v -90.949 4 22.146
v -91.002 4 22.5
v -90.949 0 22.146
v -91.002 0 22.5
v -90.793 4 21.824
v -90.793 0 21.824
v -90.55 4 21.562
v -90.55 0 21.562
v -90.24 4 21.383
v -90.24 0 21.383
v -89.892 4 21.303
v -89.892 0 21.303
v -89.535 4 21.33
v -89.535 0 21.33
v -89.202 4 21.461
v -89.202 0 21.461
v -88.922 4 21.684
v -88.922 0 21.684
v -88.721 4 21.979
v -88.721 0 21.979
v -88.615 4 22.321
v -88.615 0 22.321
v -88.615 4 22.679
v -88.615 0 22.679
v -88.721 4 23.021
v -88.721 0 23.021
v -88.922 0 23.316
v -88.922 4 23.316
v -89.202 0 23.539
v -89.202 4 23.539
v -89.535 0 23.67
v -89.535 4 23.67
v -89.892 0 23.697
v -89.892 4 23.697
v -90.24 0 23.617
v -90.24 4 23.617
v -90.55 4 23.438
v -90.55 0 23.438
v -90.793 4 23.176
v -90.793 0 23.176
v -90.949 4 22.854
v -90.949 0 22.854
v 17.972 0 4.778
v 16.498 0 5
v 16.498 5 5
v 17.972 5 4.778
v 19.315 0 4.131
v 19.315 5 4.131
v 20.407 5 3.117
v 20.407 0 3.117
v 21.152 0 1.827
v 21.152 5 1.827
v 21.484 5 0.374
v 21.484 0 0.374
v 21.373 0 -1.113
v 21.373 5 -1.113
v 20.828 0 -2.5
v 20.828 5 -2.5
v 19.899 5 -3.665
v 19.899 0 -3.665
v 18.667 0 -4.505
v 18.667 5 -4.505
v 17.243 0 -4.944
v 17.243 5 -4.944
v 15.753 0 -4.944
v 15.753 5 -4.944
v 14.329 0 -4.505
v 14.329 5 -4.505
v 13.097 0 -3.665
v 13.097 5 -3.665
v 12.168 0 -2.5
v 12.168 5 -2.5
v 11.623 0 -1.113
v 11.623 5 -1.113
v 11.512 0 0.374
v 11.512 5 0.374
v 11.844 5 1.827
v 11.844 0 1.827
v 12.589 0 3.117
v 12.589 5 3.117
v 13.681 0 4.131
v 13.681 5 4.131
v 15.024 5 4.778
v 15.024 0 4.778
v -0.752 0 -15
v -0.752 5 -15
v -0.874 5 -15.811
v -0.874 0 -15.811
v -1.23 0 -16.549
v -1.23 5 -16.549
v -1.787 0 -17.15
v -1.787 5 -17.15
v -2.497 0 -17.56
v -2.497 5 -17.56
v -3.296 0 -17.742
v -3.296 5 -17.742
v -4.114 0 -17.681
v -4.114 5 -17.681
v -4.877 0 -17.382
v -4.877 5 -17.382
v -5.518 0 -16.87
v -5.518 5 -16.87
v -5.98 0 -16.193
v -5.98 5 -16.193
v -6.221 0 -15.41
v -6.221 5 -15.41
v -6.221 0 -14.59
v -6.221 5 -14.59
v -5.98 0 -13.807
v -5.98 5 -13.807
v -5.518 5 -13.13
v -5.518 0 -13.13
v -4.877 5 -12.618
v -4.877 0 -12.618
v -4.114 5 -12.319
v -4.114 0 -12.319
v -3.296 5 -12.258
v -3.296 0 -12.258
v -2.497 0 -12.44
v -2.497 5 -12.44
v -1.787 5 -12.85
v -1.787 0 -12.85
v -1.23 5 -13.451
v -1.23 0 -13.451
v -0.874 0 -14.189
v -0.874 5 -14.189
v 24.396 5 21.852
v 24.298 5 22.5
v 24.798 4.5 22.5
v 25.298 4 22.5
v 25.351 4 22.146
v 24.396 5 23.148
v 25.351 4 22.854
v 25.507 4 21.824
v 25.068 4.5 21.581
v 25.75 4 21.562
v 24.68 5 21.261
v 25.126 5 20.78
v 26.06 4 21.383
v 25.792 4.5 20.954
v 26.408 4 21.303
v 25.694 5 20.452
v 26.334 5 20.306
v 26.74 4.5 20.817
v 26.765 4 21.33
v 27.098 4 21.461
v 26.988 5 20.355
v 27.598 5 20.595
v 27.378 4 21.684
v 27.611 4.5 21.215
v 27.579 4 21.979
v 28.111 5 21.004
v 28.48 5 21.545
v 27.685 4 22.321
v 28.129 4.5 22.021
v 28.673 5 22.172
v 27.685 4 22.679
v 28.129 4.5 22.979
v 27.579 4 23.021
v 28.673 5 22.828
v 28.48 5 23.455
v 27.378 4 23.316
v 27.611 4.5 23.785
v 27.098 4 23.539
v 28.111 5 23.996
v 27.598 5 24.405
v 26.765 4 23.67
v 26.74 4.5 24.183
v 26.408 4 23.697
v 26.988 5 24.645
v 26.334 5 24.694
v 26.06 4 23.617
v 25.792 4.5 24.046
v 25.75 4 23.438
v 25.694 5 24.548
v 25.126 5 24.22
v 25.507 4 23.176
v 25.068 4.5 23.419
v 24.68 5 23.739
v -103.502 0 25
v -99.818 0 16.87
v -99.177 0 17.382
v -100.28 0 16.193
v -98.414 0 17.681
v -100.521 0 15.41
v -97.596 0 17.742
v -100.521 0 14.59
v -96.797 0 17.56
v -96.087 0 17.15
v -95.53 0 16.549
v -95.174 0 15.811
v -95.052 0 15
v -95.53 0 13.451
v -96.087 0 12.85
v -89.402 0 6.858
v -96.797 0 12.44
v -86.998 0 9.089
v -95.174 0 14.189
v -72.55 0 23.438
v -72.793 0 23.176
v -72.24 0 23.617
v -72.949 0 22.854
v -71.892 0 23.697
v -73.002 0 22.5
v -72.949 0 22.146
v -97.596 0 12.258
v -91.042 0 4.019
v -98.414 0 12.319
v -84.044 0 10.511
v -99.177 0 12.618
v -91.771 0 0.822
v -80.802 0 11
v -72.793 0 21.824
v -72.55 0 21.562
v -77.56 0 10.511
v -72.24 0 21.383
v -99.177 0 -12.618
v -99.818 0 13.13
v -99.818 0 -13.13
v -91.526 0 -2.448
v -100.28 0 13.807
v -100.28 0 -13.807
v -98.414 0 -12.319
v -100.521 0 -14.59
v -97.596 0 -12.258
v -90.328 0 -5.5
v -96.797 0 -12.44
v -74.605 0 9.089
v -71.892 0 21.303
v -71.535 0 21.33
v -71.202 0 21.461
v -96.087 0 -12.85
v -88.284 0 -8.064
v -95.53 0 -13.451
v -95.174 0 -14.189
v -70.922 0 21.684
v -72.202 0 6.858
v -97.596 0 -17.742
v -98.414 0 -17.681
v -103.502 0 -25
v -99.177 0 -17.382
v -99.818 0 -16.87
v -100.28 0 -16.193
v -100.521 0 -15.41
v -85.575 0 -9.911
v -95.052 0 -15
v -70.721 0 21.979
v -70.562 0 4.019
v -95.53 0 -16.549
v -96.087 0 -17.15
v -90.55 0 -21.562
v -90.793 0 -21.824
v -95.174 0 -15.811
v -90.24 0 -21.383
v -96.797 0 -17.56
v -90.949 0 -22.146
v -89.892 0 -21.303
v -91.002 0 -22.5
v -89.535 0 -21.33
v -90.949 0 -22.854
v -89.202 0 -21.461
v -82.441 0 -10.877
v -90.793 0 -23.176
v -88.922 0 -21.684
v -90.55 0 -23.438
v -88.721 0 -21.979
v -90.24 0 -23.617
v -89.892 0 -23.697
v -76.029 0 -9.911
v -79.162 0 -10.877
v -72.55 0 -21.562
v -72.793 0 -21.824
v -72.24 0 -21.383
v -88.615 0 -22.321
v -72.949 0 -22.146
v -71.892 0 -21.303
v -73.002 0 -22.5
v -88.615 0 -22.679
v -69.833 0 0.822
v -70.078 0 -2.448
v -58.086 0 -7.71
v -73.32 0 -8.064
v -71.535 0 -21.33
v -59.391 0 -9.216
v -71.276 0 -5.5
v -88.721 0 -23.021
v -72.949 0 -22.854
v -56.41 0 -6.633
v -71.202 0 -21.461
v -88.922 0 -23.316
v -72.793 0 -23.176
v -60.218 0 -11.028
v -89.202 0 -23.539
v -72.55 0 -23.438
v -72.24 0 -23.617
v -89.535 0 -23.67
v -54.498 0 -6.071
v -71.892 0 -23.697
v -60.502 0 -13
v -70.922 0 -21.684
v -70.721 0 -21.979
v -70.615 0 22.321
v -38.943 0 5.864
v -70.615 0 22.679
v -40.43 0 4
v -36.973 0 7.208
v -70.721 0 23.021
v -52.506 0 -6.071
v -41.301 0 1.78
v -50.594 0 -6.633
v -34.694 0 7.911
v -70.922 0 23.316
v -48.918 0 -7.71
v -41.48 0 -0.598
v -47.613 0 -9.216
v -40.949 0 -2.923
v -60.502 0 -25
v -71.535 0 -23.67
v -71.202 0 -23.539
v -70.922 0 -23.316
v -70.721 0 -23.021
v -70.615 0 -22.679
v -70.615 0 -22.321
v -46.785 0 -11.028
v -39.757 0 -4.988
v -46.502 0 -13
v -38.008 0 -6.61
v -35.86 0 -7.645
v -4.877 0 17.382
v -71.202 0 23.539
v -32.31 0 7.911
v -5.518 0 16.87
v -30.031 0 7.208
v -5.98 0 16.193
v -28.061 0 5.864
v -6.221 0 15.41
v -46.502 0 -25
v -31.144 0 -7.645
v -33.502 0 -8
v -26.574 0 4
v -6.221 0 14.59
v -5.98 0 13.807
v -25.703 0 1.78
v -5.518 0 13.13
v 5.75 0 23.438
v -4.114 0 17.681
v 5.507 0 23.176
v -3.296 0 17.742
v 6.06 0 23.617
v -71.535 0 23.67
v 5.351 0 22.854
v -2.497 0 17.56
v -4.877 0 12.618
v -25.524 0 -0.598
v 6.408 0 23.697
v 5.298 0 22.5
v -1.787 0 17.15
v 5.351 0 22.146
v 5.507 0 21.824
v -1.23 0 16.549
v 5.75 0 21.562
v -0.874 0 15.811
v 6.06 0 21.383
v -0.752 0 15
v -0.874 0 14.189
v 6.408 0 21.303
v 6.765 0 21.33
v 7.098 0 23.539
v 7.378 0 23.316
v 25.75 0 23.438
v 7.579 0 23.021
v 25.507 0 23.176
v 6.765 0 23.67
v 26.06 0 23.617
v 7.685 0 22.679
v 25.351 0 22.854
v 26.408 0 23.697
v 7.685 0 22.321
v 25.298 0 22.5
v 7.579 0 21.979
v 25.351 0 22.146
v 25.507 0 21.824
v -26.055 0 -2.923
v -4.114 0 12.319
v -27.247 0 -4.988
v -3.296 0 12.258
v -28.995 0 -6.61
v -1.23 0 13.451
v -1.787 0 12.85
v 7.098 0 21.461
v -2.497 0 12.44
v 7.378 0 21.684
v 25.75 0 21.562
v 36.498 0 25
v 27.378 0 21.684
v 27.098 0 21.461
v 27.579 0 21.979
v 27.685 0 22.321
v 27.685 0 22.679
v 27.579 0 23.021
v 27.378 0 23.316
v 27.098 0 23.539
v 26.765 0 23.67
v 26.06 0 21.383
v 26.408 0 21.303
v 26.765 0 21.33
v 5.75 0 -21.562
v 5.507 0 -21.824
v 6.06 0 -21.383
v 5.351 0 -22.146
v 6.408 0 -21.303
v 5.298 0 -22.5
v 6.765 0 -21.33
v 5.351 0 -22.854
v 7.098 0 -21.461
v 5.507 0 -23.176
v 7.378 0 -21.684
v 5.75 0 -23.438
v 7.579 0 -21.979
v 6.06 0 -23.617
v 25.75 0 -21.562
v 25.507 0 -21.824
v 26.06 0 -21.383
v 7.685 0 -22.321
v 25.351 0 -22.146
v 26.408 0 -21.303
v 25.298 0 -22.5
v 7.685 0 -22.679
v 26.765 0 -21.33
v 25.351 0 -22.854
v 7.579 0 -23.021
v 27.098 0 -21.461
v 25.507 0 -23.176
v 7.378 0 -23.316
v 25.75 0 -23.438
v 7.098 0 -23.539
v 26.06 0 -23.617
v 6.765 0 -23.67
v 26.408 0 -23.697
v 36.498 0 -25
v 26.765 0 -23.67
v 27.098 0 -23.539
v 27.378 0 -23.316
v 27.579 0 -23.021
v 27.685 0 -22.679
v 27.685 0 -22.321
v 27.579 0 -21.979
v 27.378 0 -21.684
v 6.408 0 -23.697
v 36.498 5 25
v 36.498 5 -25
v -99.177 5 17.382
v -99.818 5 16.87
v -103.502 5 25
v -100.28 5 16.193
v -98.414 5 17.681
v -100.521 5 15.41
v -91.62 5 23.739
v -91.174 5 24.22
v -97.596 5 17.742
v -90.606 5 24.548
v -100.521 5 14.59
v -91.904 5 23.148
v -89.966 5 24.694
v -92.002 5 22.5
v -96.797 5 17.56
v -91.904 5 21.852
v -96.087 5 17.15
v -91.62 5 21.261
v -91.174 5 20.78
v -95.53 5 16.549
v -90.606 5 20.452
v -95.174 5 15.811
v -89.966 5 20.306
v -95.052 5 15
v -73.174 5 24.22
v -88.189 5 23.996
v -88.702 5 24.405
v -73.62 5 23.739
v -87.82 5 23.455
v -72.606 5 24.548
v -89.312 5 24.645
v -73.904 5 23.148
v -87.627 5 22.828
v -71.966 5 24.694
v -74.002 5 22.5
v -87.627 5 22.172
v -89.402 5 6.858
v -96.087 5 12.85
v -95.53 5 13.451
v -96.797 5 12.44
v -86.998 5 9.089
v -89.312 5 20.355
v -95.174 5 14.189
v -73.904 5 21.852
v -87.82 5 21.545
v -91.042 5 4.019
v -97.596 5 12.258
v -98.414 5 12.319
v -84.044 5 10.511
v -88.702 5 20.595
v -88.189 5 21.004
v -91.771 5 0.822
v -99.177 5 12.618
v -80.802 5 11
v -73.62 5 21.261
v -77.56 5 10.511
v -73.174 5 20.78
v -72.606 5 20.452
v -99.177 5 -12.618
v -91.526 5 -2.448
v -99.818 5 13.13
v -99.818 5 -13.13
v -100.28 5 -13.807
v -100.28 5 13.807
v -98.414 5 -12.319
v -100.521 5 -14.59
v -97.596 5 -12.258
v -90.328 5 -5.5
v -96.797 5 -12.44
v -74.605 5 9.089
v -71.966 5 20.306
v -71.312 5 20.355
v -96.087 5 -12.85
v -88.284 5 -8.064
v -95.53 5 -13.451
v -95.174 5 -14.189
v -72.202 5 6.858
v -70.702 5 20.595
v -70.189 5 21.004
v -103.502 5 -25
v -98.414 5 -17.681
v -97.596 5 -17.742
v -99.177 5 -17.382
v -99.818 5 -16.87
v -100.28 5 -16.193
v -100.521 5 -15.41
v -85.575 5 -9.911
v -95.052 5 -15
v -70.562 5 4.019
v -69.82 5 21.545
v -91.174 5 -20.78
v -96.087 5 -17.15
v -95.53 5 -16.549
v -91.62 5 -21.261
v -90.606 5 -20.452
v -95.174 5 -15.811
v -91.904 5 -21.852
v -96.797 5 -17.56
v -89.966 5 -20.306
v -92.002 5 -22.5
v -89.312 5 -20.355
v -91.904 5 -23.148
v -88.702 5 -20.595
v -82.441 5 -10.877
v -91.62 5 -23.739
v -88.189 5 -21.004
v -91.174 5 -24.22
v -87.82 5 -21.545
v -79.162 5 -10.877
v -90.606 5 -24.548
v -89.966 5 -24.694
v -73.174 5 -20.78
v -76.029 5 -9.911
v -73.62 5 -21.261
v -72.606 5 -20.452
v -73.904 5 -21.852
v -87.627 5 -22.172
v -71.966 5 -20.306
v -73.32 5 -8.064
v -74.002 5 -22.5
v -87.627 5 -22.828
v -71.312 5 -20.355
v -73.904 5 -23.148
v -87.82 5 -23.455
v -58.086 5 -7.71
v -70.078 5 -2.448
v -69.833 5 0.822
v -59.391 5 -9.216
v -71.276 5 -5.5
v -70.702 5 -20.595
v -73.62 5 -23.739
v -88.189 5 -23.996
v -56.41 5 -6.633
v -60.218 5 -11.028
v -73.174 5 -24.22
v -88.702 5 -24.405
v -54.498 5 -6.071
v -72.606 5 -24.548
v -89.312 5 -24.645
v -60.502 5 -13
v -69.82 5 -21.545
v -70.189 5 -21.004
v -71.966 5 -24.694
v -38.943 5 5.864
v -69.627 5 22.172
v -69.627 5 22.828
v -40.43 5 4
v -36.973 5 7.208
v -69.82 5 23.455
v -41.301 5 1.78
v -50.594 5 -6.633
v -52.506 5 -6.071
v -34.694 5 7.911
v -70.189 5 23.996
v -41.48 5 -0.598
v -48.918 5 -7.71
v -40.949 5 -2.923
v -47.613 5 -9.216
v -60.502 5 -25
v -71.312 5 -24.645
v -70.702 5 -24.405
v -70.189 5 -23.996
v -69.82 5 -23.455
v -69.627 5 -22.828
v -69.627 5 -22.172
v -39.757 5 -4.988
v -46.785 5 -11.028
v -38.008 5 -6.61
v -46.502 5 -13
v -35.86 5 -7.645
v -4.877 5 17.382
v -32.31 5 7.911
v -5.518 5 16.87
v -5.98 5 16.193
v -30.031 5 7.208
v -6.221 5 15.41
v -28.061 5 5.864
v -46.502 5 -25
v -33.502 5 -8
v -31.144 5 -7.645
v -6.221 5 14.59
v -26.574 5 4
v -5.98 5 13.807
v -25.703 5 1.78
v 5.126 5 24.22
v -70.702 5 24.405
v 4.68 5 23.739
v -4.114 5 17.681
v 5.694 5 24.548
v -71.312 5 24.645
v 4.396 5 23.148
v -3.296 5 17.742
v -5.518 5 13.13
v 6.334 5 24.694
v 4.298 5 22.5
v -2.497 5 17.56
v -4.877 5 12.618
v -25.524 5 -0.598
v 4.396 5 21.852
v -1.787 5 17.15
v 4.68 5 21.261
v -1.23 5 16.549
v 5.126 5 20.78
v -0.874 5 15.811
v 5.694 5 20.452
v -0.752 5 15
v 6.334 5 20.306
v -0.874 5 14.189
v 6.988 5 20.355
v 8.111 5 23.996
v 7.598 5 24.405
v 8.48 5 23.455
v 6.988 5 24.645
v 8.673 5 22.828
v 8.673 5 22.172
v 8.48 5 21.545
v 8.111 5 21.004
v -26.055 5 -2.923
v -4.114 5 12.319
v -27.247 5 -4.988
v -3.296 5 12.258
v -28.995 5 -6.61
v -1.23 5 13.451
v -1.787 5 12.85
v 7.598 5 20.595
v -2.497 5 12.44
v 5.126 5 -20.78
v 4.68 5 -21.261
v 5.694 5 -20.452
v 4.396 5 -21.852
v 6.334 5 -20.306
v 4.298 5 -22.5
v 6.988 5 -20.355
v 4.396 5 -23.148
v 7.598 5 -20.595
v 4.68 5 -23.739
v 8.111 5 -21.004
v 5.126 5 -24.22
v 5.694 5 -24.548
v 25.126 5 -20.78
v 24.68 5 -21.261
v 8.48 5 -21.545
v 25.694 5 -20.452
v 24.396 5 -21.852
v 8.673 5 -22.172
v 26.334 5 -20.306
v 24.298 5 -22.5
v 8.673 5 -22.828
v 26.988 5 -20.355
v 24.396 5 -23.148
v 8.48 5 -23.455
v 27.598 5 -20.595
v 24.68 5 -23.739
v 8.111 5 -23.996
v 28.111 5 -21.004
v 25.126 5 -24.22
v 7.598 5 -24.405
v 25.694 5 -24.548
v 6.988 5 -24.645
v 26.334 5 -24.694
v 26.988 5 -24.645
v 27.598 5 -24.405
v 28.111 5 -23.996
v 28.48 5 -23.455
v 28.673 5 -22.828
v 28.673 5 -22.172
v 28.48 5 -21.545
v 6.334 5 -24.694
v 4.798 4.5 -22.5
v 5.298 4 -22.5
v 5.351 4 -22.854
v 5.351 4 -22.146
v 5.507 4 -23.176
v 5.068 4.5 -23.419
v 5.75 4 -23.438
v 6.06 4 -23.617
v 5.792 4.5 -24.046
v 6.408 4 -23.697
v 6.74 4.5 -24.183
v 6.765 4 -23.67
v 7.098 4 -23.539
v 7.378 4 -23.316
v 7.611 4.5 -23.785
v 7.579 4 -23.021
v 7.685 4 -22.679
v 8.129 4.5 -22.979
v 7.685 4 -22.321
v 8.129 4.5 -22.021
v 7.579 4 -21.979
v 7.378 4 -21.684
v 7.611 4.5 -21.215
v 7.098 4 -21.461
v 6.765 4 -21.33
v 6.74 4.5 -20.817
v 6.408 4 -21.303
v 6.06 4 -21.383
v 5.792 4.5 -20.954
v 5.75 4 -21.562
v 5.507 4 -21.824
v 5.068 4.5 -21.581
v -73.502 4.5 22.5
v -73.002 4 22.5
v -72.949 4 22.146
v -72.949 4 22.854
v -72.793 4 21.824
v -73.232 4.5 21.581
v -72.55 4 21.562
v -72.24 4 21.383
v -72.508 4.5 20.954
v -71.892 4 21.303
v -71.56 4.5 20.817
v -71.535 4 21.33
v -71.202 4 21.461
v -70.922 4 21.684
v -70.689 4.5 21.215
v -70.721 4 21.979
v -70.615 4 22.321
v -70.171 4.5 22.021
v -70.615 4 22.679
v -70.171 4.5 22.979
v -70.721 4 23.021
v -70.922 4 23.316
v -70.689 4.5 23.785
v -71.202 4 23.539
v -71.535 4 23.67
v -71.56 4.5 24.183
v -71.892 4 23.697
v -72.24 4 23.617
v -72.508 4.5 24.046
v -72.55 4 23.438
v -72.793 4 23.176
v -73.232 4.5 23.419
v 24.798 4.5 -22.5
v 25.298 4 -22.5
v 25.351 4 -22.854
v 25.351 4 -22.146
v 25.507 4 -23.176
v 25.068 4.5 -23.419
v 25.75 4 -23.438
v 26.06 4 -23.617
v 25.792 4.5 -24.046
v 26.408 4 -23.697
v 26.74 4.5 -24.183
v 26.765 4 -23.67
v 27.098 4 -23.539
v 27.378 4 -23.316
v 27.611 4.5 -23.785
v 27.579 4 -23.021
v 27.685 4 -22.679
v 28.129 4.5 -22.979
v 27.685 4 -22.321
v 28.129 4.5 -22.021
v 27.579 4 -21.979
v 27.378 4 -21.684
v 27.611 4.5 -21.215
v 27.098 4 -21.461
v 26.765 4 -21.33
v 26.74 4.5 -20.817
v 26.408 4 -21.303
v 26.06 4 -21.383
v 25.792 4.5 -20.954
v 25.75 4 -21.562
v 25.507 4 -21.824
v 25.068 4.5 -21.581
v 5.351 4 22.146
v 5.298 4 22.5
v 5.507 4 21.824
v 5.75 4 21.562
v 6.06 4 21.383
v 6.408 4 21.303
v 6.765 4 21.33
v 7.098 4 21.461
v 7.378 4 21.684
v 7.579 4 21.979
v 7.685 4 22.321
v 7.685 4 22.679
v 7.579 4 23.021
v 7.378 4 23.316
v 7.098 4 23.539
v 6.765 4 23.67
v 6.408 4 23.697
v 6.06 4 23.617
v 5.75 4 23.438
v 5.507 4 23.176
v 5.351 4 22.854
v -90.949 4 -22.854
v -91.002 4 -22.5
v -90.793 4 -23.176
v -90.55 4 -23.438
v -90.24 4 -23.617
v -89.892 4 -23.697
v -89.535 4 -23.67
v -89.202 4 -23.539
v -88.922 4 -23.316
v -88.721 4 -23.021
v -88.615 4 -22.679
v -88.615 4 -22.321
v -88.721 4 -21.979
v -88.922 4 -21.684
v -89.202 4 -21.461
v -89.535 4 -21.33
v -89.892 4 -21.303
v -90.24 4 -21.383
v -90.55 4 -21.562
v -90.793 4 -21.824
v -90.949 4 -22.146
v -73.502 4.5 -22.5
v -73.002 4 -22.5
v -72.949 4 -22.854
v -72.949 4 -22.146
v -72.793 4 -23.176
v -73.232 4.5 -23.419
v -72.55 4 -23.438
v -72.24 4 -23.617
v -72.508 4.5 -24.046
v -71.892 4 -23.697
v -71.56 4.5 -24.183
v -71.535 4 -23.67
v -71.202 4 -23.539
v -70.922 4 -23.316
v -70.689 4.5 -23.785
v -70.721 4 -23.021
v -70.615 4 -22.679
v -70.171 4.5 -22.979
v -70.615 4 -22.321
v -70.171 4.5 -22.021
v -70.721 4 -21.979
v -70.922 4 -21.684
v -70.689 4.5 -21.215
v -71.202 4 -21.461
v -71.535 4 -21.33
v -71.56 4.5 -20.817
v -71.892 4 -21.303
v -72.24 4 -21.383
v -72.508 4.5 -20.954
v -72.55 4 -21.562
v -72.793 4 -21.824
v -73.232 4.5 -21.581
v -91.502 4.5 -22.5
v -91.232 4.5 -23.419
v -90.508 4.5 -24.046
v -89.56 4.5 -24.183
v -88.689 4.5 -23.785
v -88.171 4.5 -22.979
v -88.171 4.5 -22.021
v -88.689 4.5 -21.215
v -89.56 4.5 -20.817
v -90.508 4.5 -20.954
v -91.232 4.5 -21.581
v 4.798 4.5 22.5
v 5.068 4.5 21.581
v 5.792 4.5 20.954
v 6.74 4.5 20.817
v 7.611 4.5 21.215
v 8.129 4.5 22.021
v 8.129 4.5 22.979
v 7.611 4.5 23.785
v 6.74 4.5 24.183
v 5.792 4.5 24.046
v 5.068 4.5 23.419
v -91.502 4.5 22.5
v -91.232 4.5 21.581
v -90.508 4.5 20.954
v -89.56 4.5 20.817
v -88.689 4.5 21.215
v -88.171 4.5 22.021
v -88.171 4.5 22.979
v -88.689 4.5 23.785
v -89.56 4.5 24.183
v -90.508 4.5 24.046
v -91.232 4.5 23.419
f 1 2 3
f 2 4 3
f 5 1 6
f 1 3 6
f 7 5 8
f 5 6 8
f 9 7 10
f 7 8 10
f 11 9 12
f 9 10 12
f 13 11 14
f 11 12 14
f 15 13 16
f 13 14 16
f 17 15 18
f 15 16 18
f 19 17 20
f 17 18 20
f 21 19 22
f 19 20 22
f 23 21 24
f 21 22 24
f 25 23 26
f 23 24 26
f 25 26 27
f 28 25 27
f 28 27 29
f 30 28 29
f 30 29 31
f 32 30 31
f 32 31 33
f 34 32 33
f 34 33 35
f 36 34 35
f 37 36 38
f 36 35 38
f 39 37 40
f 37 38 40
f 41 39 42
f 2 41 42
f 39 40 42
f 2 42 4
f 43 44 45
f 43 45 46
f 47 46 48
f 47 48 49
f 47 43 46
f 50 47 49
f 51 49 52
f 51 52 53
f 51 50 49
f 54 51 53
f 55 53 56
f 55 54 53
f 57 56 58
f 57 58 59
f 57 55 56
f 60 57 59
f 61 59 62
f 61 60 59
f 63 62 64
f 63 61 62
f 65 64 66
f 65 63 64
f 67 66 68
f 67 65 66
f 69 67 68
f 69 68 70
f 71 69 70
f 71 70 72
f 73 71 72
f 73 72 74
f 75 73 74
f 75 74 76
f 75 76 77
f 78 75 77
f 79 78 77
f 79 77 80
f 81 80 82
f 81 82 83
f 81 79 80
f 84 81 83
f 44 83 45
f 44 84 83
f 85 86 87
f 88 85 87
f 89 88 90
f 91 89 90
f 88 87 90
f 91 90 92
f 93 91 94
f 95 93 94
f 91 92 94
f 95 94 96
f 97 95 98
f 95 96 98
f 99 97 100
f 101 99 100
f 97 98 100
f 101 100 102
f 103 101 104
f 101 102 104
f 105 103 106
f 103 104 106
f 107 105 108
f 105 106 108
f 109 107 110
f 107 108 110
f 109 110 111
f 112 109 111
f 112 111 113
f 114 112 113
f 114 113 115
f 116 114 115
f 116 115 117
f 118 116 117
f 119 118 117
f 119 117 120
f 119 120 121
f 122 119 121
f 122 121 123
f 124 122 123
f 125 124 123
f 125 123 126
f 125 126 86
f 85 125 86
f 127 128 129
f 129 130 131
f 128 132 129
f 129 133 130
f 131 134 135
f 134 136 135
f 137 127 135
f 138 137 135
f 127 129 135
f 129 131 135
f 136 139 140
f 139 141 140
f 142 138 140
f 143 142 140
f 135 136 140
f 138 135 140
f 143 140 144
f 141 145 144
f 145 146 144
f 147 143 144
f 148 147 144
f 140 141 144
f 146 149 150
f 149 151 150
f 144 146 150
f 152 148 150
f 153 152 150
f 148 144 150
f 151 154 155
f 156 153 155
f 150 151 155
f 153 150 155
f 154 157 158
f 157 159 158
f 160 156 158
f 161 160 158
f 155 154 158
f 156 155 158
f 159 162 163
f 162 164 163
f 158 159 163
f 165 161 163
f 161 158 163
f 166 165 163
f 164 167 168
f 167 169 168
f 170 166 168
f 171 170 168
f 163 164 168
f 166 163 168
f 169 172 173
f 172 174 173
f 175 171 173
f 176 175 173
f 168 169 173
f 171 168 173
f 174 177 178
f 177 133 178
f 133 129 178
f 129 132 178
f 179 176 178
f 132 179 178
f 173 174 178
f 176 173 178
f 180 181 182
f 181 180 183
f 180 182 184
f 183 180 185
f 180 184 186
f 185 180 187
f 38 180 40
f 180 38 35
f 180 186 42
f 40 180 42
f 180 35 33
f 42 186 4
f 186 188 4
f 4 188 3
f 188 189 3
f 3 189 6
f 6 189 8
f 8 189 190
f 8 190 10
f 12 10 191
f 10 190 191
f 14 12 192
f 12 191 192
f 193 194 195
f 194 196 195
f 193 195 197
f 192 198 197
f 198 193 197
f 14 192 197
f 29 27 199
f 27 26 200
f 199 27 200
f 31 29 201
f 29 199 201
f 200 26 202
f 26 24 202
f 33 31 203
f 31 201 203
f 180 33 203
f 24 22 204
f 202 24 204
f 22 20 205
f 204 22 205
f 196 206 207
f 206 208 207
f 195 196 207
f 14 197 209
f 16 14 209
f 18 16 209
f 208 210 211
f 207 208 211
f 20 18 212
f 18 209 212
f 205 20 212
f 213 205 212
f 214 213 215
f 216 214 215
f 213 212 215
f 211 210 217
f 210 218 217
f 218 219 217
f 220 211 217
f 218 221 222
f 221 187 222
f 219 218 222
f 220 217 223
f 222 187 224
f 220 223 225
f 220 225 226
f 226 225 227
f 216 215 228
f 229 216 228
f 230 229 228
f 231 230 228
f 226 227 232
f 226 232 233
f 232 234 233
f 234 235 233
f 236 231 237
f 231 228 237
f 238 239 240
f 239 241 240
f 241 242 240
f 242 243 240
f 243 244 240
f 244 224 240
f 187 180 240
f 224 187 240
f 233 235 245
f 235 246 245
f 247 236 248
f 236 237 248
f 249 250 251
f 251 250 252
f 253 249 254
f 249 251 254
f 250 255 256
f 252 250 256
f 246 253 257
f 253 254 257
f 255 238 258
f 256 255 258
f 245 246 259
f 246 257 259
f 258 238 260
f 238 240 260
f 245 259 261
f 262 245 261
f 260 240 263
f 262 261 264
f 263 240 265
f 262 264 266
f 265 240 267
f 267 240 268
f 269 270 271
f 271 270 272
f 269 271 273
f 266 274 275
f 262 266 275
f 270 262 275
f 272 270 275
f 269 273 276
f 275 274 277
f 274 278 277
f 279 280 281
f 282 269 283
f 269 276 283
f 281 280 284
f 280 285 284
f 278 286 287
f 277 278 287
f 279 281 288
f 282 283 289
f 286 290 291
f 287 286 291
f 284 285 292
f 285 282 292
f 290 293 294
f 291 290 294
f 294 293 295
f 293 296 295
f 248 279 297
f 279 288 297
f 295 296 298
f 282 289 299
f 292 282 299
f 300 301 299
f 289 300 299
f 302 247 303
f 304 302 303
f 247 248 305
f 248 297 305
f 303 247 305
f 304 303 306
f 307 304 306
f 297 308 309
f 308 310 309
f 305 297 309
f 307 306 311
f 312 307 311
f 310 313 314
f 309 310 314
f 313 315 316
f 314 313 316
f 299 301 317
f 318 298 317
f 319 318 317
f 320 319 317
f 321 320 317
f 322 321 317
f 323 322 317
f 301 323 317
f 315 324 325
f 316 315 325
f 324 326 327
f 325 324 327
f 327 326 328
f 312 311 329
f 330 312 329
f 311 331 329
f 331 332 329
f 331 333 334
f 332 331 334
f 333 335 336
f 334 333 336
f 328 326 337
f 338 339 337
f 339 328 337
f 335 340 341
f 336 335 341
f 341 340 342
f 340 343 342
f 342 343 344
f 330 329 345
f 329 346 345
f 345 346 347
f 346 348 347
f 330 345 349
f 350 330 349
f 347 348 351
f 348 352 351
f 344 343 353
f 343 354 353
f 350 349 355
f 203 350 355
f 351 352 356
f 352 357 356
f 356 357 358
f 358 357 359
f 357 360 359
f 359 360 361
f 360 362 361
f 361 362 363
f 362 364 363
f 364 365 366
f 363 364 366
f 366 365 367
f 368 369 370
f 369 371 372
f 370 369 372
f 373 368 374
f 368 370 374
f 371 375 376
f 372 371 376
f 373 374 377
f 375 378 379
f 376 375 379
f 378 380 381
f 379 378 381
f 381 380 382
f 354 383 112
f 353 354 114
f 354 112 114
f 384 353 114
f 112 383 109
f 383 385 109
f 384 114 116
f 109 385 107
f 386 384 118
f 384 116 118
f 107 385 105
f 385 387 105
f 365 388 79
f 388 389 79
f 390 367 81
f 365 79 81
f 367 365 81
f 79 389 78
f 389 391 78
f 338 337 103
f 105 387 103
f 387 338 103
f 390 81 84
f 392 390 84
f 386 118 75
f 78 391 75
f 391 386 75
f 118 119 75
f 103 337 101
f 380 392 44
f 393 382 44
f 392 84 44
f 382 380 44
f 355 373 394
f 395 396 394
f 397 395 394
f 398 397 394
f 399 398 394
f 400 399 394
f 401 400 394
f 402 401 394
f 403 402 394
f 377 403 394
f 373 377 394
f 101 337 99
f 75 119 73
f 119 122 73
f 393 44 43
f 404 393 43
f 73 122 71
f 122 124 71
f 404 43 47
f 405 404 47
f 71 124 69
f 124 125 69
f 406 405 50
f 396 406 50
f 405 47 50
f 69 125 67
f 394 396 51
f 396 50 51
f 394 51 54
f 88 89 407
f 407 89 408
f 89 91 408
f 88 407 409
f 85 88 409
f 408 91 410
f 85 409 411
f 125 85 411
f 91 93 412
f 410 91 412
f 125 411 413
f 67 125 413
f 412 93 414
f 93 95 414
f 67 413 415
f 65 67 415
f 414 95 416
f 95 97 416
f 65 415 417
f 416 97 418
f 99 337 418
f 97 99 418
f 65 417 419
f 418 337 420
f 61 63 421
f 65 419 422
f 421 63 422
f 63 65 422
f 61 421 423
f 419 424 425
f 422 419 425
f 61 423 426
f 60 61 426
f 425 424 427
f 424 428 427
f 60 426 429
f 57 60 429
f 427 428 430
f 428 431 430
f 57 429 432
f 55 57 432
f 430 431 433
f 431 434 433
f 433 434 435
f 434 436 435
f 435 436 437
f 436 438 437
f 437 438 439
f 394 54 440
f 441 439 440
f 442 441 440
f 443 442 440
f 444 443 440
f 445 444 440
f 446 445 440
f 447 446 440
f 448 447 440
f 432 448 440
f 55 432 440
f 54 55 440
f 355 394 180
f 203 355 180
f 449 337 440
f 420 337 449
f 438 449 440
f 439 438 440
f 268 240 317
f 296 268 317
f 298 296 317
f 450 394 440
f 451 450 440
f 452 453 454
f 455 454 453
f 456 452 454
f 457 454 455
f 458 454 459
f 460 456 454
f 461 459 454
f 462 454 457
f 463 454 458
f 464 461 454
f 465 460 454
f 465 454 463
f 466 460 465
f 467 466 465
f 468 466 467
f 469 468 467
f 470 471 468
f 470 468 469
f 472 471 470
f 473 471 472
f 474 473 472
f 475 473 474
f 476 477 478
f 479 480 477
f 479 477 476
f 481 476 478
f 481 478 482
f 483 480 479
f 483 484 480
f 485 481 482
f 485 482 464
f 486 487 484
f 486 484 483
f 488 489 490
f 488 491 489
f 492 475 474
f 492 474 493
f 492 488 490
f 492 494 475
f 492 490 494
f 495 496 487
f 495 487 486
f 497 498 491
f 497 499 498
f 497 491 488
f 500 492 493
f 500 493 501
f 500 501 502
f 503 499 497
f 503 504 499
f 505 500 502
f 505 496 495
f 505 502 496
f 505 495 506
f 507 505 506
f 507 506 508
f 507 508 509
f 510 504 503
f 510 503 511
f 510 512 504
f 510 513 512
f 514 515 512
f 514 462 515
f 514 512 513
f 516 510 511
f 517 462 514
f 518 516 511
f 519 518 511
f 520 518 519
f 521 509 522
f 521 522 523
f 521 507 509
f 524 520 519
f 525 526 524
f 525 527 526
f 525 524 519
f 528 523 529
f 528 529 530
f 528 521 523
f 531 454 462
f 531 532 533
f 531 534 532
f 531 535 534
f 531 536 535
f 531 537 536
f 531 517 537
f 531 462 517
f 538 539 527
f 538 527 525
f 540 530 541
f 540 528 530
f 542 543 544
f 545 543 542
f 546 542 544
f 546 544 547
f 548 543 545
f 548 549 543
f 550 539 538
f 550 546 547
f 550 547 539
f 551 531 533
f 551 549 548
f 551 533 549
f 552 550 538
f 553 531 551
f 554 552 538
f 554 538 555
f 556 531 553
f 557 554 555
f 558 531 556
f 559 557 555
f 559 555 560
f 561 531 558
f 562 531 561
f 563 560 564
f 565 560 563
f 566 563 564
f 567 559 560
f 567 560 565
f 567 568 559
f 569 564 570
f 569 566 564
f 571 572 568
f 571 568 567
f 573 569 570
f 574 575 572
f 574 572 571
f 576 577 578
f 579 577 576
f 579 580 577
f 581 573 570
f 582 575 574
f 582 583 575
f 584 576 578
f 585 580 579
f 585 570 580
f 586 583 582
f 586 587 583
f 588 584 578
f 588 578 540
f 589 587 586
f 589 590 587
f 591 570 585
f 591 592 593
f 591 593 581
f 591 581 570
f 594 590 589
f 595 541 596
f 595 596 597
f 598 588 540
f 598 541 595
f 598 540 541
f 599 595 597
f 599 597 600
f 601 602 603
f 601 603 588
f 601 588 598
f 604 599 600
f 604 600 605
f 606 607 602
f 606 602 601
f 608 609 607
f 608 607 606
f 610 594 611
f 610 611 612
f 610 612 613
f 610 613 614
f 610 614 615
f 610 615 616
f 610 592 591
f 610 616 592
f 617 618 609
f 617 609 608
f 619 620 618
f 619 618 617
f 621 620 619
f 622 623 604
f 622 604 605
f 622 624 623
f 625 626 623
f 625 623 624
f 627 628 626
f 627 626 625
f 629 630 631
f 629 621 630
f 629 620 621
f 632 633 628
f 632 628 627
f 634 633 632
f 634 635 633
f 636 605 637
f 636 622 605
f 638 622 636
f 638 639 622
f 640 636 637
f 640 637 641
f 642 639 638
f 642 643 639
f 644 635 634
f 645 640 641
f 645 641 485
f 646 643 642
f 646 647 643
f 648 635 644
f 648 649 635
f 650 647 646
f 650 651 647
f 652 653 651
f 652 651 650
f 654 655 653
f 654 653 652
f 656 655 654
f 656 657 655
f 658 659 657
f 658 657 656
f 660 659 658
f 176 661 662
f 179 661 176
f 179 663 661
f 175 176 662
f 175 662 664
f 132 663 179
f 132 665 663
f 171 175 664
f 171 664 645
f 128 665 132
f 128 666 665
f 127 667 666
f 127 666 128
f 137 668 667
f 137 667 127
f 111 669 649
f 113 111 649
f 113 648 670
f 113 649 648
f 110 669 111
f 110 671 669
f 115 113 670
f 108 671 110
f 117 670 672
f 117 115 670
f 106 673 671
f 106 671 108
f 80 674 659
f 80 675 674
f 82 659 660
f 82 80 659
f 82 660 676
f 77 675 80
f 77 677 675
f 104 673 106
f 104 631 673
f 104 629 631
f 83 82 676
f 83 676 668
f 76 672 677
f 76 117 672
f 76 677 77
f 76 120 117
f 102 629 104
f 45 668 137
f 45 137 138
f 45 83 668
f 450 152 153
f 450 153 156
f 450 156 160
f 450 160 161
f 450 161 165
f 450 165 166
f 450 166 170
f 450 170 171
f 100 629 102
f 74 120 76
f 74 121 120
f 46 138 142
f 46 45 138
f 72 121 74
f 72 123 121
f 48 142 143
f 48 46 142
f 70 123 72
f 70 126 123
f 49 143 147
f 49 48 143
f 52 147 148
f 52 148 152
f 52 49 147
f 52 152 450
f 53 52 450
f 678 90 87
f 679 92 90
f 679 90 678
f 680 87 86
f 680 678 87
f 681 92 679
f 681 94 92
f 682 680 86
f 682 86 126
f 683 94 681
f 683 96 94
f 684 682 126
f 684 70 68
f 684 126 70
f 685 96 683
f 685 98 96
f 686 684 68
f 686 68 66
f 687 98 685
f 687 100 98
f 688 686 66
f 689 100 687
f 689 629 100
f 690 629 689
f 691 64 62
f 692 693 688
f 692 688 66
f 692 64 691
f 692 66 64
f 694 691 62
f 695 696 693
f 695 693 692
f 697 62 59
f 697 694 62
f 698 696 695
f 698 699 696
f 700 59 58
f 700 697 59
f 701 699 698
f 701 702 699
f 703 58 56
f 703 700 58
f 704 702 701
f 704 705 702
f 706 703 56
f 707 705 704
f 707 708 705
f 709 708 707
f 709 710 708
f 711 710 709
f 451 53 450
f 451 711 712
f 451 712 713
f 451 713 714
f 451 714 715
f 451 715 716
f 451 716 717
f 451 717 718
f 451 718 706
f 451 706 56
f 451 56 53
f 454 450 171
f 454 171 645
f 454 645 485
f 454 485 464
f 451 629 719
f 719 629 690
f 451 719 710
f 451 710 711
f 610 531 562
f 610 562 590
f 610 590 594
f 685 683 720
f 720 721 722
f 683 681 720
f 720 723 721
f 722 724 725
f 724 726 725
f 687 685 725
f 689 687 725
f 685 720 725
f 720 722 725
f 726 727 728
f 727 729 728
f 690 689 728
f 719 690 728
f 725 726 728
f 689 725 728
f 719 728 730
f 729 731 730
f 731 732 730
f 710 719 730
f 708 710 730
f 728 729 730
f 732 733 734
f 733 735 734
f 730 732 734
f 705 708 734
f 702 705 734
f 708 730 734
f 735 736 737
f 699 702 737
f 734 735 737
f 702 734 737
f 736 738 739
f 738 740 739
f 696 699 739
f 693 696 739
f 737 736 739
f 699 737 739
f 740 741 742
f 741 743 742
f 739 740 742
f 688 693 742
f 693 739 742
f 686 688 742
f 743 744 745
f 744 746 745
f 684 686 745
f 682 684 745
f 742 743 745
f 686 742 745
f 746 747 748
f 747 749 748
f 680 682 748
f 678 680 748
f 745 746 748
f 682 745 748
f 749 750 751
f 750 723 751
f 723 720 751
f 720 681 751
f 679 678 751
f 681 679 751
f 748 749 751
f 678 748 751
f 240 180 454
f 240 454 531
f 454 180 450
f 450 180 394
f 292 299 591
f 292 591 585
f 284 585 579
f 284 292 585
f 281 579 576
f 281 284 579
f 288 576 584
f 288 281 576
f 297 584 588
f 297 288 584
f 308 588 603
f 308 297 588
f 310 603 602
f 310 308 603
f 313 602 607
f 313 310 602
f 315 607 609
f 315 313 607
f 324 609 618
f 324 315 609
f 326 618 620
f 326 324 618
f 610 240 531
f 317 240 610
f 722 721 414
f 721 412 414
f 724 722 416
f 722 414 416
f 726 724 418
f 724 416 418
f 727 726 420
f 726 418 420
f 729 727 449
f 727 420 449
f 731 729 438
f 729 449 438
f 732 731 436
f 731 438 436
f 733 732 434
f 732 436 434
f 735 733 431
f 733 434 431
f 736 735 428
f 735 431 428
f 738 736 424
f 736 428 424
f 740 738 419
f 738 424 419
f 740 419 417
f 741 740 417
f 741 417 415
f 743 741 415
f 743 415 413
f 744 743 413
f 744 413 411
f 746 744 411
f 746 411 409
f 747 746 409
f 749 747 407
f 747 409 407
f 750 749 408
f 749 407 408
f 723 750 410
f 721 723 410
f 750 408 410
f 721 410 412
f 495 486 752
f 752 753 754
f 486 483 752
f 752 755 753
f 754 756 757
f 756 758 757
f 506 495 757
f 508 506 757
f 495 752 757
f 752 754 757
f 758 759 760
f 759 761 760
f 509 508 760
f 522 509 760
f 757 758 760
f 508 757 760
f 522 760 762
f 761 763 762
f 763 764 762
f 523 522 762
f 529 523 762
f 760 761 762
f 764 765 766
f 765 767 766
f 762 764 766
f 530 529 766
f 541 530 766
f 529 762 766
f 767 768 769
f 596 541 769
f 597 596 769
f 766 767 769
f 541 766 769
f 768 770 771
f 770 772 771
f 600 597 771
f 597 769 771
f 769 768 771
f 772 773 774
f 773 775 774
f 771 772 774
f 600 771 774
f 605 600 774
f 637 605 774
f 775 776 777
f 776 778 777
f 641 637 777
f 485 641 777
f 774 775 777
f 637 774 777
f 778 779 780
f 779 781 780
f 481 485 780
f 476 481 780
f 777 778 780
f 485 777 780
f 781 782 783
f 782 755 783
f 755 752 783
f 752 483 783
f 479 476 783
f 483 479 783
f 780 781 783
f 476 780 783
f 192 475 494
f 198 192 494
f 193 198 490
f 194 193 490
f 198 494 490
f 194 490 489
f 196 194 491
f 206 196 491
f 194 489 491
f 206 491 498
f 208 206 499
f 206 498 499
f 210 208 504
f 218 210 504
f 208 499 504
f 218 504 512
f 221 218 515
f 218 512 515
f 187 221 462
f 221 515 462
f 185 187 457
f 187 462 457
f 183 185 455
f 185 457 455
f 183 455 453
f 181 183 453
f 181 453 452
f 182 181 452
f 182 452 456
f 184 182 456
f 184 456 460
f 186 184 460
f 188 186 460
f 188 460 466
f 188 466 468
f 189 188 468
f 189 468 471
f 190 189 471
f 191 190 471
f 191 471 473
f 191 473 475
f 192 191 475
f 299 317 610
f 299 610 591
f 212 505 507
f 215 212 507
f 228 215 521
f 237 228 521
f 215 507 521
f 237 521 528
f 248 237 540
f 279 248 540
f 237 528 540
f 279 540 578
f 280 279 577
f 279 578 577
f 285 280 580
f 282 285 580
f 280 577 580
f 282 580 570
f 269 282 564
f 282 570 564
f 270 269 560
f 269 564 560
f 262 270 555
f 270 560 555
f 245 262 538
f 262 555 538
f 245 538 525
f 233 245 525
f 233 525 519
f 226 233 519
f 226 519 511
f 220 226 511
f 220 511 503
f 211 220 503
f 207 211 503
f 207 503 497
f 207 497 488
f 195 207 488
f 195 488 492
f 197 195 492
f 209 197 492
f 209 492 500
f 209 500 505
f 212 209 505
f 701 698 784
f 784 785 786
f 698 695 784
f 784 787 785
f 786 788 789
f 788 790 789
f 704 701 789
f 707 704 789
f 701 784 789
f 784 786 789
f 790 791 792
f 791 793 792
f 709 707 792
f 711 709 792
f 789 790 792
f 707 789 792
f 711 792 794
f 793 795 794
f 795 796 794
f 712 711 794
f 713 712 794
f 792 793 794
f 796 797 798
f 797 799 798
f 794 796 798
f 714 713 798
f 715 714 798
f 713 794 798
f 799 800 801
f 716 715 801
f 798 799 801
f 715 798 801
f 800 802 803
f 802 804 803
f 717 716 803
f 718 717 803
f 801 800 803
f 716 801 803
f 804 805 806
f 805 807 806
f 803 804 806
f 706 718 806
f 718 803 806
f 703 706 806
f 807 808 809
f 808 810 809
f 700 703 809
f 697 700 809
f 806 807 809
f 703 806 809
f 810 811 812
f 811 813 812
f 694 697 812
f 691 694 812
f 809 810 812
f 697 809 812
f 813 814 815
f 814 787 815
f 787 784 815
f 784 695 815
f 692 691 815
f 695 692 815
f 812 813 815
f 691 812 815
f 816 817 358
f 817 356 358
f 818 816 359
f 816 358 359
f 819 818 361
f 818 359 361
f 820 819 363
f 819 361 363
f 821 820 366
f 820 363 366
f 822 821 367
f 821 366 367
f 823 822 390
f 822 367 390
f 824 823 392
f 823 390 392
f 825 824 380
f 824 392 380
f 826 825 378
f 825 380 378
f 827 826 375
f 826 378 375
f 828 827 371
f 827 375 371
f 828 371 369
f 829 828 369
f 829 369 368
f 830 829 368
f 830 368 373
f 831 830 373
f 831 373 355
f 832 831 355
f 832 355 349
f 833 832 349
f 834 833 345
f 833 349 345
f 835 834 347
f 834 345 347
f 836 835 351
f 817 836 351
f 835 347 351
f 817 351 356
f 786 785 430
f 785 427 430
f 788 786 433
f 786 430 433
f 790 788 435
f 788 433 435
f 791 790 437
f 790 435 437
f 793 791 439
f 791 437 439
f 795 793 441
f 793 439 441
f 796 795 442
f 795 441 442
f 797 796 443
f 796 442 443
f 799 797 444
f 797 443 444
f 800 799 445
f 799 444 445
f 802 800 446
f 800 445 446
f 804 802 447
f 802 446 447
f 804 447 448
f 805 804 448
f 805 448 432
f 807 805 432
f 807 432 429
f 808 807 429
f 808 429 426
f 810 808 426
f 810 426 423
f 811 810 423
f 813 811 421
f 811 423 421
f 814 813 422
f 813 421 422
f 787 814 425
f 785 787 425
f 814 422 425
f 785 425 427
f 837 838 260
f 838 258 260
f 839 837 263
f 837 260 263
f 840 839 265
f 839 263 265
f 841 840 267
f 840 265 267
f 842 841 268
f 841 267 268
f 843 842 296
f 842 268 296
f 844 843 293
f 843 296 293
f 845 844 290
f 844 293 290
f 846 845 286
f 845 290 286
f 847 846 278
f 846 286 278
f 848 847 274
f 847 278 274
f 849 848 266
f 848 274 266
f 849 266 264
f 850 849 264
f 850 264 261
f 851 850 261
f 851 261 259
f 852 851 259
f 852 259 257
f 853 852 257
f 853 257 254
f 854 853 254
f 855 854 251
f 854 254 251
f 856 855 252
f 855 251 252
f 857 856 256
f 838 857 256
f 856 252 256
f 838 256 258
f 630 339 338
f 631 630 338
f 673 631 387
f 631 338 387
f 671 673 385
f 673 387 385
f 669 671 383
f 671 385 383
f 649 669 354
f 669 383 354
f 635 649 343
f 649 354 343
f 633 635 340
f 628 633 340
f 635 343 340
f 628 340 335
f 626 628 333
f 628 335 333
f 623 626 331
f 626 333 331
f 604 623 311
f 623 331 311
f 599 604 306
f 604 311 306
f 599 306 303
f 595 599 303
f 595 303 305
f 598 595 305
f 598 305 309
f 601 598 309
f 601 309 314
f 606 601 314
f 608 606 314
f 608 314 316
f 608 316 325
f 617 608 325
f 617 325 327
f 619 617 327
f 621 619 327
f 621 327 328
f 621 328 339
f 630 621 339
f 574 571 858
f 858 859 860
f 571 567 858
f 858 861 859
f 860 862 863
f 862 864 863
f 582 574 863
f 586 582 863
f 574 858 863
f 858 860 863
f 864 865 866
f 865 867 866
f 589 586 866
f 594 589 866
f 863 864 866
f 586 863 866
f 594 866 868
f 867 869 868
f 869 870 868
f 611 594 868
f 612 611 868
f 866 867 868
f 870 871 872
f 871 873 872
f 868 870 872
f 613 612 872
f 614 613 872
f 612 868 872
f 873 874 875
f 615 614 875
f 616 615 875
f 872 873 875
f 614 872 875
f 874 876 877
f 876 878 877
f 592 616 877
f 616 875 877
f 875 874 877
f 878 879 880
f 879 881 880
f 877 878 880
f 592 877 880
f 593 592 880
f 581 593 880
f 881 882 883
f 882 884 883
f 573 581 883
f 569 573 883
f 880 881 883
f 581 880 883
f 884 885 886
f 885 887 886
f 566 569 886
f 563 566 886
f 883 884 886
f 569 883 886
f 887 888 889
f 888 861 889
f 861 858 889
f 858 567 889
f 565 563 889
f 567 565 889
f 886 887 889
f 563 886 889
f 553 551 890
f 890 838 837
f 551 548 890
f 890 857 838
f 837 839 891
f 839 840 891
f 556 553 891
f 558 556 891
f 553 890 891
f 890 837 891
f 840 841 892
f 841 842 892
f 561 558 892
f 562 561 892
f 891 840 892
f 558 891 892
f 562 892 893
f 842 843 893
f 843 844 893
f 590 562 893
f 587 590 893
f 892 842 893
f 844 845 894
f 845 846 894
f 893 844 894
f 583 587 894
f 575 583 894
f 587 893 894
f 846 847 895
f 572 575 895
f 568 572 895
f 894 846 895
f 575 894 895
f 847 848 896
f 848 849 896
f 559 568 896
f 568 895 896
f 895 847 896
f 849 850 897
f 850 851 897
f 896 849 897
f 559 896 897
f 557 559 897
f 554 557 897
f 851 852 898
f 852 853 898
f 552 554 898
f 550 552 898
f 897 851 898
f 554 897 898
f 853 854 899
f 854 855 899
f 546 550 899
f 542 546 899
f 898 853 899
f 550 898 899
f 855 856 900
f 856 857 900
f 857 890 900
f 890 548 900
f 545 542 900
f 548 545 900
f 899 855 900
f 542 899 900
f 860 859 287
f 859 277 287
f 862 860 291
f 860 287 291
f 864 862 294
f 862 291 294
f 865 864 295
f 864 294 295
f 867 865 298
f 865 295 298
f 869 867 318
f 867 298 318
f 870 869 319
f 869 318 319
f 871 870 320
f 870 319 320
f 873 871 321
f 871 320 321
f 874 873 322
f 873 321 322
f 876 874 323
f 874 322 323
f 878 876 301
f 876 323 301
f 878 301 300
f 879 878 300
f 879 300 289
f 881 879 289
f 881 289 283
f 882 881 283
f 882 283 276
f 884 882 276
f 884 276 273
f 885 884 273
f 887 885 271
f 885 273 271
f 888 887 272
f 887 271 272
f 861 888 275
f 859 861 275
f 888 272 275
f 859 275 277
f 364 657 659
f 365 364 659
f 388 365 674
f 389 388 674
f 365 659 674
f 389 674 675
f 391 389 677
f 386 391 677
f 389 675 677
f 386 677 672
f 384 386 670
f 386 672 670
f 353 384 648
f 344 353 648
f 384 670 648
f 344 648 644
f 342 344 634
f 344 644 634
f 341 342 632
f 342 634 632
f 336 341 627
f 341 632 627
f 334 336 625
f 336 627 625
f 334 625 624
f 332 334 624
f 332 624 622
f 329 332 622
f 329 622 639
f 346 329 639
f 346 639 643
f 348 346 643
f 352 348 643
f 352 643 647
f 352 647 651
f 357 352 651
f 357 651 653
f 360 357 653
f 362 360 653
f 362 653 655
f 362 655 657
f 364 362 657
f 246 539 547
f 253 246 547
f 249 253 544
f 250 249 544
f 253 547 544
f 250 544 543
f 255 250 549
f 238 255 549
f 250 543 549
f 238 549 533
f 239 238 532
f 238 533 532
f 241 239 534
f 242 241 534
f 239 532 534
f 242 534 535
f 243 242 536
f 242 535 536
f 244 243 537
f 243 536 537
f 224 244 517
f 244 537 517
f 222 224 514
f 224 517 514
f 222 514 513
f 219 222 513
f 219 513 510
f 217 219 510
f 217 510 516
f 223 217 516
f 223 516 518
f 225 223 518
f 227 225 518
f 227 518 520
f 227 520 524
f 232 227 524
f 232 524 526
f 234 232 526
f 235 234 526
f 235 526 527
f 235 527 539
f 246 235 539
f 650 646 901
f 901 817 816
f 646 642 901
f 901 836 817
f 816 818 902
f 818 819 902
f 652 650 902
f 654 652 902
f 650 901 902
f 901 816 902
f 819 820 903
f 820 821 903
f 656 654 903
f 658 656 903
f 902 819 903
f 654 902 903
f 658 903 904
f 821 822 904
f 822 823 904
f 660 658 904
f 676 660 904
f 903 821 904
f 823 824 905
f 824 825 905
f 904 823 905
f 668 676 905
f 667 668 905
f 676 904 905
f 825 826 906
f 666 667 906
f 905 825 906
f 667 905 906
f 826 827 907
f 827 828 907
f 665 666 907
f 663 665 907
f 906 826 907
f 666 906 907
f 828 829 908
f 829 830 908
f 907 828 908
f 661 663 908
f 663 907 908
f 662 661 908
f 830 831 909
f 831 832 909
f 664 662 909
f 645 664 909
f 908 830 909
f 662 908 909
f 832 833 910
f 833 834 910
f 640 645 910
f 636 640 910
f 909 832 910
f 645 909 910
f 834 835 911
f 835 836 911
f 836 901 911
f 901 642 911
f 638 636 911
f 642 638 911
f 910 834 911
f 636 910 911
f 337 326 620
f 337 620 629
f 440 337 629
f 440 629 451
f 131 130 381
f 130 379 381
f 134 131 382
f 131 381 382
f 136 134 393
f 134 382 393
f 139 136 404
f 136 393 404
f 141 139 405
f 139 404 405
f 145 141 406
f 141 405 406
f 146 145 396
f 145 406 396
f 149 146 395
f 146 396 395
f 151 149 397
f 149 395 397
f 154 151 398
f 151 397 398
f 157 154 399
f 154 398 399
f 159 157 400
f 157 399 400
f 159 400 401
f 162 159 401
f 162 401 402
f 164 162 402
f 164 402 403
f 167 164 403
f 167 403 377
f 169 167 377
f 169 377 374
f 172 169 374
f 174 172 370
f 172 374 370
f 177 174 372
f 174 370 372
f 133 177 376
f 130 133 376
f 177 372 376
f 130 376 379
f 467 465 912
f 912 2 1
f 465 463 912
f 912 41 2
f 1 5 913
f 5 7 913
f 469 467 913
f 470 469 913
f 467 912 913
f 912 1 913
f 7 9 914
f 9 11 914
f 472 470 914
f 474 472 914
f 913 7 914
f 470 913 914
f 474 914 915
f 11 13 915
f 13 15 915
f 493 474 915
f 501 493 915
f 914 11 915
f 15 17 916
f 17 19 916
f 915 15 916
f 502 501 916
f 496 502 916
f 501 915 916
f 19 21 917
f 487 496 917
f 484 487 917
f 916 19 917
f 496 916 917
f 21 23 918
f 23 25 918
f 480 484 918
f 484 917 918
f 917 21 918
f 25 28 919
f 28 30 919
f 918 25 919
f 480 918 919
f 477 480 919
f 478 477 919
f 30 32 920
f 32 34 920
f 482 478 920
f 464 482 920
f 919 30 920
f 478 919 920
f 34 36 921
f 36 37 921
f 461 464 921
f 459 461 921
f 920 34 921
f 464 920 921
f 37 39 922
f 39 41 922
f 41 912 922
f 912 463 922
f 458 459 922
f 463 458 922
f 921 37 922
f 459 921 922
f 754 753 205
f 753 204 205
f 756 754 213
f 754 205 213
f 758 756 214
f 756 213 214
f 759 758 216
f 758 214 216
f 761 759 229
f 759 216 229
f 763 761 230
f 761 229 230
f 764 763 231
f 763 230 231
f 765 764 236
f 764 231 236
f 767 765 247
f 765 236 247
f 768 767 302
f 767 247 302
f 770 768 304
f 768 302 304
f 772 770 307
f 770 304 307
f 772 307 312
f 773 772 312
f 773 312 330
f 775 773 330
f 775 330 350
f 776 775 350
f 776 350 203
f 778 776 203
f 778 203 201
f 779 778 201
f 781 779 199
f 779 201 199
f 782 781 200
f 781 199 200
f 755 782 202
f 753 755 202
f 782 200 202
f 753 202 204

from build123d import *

# Parameters (mm, degrees)
SKETCH1_W                                           = 140
SKETCH1_H                                           = 50
SKETCH1_R                                           = 5
BOSS_EXTRUDE2_DEPTH                                 = 5
CUT_EXTRUDE1_REACH                                  = 108.596
SKETCH5_R                                           = 8
CUT_EXTRUDE2_REACH                                  = 108.596
SKETCH14_R                                          = 11
CSK_FOR_M2_COUNTERSUNK_FLAT_HEAD_SCREW1_D           = 2.4
CSK_FOR_M2_COUNTERSUNK_FLAT_HEAD_SCREW1_CSINK_D     = 4.4
CSK_FOR_M2_COUNTERSUNK_FLAT_HEAD_SCREW1_CSINK_ANGLE = 90
M5_CLEARANCE_HOLE1_D                                = 5.5
M5_CLEARANCE_HOLE1_DEPTH                            = 19.75
M5_CLEARANCE_HOLE1_TIP                              = 1.652366702
CUT_EXTRUDE3_DEPTH                                  = 107.595732004


with BuildPart() as part:
    # Sketch1 → Boss-Extrude2 (new body)
    with BuildSketch(Plane(origin=(0, 0, 0), x_dir=(1, 0, 0), z_dir=(0, 1, 0))):
        with Locations((-33.501932743, 0)):
            Rectangle(SKETCH1_W, SKETCH1_H)
        with Locations(Location((16.498067257, 0, 0), (0, 0, 270))):
            Circle(SKETCH1_R, mode=Mode.SUBTRACT)
    extrude(amount=BOSS_EXTRUDE2_DEPTH)

    # Sketch5 → Cut-Extrude1 (cut, up to next)
    with BuildSketch(Plane.XZ, mode=Mode.PRIVATE) as cut_extrude1_sk1:
        with Locations(Location((-33.501932743, 0, 0), (0, 0, 270))):
            Circle(SKETCH5_R)
    cut_extrude1_tool1 = extrude(cut_extrude1_sk1.sketch, amount=-CUT_EXTRUDE1_REACH, mode=Mode.PRIVATE) & part.part
    add(cut_extrude1_tool1.solids().sort_by_distance((-33.501933, 0, 0))[0], mode=Mode.SUBTRACT)

    # Sketch14 → Cut-Extrude2 (cut, up to next)
    with BuildSketch(Plane(origin=(0, 5, 0), x_dir=(1, 0, 0), z_dir=(0, 1, 0)), mode=Mode.PRIVATE) as cut_extrude2_sk1:
        with Locations(Location((-80.801932743, 0, 0), (0, 0, 270))):
            Circle(SKETCH14_R)
    cut_extrude2_tool1 = extrude(cut_extrude2_sk1.sketch, amount=-CUT_EXTRUDE2_REACH, mode=Mode.PRIVATE) & part.part
    add(cut_extrude2_tool1.solids().sort_by_distance((-80.801933, 5, 0))[0], mode=Mode.SUBTRACT)

    # CSK for M2 Countersunk Flat Head Screw1 (through all)
    with Locations(Plane(origin=(0, 5, 0), x_dir=(1, 0, 0), z_dir=(0, 1, 0))):
        with Locations((-89.801932743, 22.5), (-71.801932743, 22.5), (-71.801932743, -22.5), (-89.801932743, -22.5), (6.498067257, 22.5), (26.498067257, 22.5), (6.498067257, -22.5), (26.498067257, -22.5)):
            CounterSinkHole(CSK_FOR_M2_COUNTERSUNK_FLAT_HEAD_SCREW1_D / 2, CSK_FOR_M2_COUNTERSUNK_FLAT_HEAD_SCREW1_CSINK_D / 2, counter_sink_angle=CSK_FOR_M2_COUNTERSUNK_FLAT_HEAD_SCREW1_CSINK_ANGLE)

    # M5 Clearance Hole1
    with Locations(Plane(origin=(0, 0, 0), x_dir=(-1, 0, 0), z_dir=(0, -1, 0))):
        with Locations((97.801932743, 15), (97.801932743, -15), (3.501932743, -15), (3.501932743, 15)):
            Hole(M5_CLEARANCE_HOLE1_D / 2, depth=M5_CLEARANCE_HOLE1_DEPTH)
            with Locations((0, 0, -(M5_CLEARANCE_HOLE1_DEPTH + M5_CLEARANCE_HOLE1_TIP / 2))):  # 118° drill point
                Cone(0, M5_CLEARANCE_HOLE1_D / 2, M5_CLEARANCE_HOLE1_TIP, mode=Mode.SUBTRACT)

    # Sketch20 → Cut-Extrude3 (cut, through all)
    with BuildSketch(Plane(origin=(0, 0, 0), x_dir=(-1, 0, 0), z_dir=(0, -1, 0))):
        with BuildLine():
            Line((46.501932743, 13), (46.501932743, 25))
            ThreePointArc((46.501932743, 25), (53.501932743, 32), (60.501932743, 25))
            Line((60.501932743, 25), (60.501932743, 13))
            ThreePointArc((60.501932743, 13), (53.501932743, 6), (46.501932743, 13))
        make_face()
    extrude(amount=-CUT_EXTRUDE3_DEPTH, mode=Mode.SUBTRACT)


solid = part.part
